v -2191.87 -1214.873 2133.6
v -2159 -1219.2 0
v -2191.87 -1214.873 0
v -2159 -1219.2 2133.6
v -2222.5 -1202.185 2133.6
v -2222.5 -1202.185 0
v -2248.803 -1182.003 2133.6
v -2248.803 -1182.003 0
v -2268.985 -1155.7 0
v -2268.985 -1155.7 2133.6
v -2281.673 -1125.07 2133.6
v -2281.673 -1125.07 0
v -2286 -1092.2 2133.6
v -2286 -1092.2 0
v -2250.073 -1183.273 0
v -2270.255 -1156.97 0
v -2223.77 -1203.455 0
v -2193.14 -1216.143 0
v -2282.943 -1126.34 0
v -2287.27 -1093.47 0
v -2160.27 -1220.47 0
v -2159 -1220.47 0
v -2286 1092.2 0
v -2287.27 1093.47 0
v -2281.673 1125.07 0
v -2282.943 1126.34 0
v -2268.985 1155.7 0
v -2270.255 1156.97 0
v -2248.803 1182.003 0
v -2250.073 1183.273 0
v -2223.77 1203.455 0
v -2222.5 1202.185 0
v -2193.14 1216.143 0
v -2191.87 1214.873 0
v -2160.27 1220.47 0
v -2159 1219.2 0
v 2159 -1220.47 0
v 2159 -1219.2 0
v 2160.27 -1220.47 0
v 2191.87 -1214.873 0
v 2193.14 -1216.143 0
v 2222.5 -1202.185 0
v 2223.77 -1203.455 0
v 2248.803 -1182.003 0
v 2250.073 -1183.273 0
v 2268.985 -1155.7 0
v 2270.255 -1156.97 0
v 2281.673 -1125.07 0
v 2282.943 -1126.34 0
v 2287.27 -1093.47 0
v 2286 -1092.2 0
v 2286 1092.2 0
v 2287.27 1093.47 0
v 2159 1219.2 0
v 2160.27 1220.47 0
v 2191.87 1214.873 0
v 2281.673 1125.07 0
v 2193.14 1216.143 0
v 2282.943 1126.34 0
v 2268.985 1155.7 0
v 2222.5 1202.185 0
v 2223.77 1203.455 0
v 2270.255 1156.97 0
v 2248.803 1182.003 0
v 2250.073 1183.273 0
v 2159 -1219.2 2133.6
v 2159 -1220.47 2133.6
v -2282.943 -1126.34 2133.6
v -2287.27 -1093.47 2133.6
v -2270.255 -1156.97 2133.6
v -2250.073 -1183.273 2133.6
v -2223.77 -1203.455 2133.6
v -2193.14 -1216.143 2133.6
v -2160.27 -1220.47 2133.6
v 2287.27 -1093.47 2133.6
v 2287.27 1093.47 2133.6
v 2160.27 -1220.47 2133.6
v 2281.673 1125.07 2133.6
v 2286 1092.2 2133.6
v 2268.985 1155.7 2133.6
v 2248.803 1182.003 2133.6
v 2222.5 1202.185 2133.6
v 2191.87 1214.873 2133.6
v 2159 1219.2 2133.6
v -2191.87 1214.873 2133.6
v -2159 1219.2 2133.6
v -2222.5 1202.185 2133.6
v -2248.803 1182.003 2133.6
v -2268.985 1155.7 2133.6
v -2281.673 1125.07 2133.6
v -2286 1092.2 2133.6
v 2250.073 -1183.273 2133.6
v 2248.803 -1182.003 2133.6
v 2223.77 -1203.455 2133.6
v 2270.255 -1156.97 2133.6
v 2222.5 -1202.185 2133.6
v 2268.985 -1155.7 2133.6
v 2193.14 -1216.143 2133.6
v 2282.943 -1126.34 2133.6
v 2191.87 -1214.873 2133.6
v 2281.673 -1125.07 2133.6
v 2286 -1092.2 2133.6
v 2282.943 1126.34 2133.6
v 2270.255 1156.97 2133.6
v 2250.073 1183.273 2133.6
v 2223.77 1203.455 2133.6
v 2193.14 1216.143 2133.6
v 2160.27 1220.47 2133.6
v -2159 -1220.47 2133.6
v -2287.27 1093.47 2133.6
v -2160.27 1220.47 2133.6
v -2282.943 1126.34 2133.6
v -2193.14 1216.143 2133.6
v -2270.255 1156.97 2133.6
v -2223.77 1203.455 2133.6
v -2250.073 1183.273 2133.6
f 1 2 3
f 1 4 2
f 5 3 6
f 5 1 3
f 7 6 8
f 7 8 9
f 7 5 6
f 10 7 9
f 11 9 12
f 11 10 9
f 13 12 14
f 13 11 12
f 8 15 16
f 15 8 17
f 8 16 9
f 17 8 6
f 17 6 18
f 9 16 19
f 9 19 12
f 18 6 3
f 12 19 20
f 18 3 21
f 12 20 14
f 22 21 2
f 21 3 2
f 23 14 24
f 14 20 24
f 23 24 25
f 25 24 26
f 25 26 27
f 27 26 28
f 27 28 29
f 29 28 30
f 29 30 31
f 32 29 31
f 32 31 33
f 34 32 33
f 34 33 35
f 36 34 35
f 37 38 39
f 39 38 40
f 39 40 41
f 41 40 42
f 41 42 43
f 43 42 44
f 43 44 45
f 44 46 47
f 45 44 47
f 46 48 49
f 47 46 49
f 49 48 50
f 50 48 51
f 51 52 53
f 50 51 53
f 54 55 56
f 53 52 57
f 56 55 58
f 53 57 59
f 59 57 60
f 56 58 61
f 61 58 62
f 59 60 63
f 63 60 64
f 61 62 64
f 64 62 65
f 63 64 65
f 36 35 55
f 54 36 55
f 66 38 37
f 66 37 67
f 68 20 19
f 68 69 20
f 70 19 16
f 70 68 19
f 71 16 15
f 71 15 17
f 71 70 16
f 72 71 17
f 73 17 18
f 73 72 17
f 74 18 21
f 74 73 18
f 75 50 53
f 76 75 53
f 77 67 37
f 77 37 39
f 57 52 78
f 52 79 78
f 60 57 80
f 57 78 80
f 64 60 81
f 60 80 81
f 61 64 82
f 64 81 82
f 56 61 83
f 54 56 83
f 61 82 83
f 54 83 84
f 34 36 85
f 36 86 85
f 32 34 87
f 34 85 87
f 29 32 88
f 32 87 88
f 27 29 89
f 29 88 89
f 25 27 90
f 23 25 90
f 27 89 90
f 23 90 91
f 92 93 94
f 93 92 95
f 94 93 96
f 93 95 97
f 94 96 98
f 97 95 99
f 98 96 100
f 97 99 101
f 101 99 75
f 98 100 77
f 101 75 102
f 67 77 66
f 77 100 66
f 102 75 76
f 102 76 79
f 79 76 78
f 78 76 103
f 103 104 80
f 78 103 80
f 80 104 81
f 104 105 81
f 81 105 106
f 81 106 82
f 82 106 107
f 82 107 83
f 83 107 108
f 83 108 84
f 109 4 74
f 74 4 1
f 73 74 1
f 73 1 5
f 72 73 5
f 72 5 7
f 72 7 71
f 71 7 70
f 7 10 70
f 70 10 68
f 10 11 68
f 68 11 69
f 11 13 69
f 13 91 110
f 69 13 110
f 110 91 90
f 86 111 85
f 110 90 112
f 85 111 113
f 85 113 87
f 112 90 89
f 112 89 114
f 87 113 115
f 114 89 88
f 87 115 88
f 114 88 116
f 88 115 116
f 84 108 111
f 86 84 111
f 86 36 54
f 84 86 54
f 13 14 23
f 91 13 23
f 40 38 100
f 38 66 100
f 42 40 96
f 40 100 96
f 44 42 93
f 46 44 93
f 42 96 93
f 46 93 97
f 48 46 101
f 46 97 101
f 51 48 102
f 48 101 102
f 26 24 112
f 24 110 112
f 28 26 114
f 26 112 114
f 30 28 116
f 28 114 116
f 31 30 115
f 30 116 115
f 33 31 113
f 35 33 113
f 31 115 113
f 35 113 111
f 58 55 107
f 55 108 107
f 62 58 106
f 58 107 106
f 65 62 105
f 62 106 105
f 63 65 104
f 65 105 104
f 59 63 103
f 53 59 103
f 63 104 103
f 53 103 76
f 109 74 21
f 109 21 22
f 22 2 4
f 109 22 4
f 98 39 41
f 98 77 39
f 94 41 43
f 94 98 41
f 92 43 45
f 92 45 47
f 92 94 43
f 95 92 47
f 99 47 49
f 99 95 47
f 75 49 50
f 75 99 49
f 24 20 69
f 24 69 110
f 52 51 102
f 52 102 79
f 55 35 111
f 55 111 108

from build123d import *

# Parameters (mm, degrees)
F0_W     = 4574.54
F0_H     = 2440.94
F0_W_2   = 4572
F0_H_2   = 2438.4
F1_DEPTH = 2438.4
F2_W     = 4574.54
F2_H     = 304.8
F3_DEPTH = 2440.941
F4_R     = 127
F5_DEPTH = 25.4


with BuildPart() as f1:
    # F0 (on Top) → F1 (new body)
    with BuildSketch(Plane.XY):
        Rectangle(F0_W, F0_H)
        Rectangle(F0_W_2, F0_H_2, mode=Mode.SUBTRACT)
    extrude(amount=F1_DEPTH)

    # F2 (on face) → F3 (cut, through all)
    with BuildSketch(Plane(origin=(0, 1220.47, 0), x_dir=(-1, 0, 0), z_dir=(0, 1, 0))):
        with Locations((0, 2286)):
            Rectangle(F2_W, F2_H)
    extrude(amount=-F3_DEPTH, mode=Mode.SUBTRACT)

    # F4
    f4_edges = [f1.edges().sort_by_distance(p)[0] for p in [
        (-2287.27, 1220.47, 1066.8),
        (-2286, 1219.2, 1066.8),
        (-2287.27, -1220.47, 1066.8),
        (-2286, -1219.2, 1066.8),
        (2286, -1219.2, 1066.8),
        (2287.27, -1220.47, 1066.8),
        (2286, 1219.2, 1066.8),
        (2287.27, 1220.47, 1066.8),
    ]]
    fillet(f4_edges, radius=F4_R)

    # F5 (cut): a face of the model
    f5_faces = [f1.faces().sort_by_distance(p)[0] for p in [
        (0, -1219.2, 1066.8),
    ]]
    extrude(f5_faces, amount=-F5_DEPTH, mode=Mode.SUBTRACT)


solid = f1.part
